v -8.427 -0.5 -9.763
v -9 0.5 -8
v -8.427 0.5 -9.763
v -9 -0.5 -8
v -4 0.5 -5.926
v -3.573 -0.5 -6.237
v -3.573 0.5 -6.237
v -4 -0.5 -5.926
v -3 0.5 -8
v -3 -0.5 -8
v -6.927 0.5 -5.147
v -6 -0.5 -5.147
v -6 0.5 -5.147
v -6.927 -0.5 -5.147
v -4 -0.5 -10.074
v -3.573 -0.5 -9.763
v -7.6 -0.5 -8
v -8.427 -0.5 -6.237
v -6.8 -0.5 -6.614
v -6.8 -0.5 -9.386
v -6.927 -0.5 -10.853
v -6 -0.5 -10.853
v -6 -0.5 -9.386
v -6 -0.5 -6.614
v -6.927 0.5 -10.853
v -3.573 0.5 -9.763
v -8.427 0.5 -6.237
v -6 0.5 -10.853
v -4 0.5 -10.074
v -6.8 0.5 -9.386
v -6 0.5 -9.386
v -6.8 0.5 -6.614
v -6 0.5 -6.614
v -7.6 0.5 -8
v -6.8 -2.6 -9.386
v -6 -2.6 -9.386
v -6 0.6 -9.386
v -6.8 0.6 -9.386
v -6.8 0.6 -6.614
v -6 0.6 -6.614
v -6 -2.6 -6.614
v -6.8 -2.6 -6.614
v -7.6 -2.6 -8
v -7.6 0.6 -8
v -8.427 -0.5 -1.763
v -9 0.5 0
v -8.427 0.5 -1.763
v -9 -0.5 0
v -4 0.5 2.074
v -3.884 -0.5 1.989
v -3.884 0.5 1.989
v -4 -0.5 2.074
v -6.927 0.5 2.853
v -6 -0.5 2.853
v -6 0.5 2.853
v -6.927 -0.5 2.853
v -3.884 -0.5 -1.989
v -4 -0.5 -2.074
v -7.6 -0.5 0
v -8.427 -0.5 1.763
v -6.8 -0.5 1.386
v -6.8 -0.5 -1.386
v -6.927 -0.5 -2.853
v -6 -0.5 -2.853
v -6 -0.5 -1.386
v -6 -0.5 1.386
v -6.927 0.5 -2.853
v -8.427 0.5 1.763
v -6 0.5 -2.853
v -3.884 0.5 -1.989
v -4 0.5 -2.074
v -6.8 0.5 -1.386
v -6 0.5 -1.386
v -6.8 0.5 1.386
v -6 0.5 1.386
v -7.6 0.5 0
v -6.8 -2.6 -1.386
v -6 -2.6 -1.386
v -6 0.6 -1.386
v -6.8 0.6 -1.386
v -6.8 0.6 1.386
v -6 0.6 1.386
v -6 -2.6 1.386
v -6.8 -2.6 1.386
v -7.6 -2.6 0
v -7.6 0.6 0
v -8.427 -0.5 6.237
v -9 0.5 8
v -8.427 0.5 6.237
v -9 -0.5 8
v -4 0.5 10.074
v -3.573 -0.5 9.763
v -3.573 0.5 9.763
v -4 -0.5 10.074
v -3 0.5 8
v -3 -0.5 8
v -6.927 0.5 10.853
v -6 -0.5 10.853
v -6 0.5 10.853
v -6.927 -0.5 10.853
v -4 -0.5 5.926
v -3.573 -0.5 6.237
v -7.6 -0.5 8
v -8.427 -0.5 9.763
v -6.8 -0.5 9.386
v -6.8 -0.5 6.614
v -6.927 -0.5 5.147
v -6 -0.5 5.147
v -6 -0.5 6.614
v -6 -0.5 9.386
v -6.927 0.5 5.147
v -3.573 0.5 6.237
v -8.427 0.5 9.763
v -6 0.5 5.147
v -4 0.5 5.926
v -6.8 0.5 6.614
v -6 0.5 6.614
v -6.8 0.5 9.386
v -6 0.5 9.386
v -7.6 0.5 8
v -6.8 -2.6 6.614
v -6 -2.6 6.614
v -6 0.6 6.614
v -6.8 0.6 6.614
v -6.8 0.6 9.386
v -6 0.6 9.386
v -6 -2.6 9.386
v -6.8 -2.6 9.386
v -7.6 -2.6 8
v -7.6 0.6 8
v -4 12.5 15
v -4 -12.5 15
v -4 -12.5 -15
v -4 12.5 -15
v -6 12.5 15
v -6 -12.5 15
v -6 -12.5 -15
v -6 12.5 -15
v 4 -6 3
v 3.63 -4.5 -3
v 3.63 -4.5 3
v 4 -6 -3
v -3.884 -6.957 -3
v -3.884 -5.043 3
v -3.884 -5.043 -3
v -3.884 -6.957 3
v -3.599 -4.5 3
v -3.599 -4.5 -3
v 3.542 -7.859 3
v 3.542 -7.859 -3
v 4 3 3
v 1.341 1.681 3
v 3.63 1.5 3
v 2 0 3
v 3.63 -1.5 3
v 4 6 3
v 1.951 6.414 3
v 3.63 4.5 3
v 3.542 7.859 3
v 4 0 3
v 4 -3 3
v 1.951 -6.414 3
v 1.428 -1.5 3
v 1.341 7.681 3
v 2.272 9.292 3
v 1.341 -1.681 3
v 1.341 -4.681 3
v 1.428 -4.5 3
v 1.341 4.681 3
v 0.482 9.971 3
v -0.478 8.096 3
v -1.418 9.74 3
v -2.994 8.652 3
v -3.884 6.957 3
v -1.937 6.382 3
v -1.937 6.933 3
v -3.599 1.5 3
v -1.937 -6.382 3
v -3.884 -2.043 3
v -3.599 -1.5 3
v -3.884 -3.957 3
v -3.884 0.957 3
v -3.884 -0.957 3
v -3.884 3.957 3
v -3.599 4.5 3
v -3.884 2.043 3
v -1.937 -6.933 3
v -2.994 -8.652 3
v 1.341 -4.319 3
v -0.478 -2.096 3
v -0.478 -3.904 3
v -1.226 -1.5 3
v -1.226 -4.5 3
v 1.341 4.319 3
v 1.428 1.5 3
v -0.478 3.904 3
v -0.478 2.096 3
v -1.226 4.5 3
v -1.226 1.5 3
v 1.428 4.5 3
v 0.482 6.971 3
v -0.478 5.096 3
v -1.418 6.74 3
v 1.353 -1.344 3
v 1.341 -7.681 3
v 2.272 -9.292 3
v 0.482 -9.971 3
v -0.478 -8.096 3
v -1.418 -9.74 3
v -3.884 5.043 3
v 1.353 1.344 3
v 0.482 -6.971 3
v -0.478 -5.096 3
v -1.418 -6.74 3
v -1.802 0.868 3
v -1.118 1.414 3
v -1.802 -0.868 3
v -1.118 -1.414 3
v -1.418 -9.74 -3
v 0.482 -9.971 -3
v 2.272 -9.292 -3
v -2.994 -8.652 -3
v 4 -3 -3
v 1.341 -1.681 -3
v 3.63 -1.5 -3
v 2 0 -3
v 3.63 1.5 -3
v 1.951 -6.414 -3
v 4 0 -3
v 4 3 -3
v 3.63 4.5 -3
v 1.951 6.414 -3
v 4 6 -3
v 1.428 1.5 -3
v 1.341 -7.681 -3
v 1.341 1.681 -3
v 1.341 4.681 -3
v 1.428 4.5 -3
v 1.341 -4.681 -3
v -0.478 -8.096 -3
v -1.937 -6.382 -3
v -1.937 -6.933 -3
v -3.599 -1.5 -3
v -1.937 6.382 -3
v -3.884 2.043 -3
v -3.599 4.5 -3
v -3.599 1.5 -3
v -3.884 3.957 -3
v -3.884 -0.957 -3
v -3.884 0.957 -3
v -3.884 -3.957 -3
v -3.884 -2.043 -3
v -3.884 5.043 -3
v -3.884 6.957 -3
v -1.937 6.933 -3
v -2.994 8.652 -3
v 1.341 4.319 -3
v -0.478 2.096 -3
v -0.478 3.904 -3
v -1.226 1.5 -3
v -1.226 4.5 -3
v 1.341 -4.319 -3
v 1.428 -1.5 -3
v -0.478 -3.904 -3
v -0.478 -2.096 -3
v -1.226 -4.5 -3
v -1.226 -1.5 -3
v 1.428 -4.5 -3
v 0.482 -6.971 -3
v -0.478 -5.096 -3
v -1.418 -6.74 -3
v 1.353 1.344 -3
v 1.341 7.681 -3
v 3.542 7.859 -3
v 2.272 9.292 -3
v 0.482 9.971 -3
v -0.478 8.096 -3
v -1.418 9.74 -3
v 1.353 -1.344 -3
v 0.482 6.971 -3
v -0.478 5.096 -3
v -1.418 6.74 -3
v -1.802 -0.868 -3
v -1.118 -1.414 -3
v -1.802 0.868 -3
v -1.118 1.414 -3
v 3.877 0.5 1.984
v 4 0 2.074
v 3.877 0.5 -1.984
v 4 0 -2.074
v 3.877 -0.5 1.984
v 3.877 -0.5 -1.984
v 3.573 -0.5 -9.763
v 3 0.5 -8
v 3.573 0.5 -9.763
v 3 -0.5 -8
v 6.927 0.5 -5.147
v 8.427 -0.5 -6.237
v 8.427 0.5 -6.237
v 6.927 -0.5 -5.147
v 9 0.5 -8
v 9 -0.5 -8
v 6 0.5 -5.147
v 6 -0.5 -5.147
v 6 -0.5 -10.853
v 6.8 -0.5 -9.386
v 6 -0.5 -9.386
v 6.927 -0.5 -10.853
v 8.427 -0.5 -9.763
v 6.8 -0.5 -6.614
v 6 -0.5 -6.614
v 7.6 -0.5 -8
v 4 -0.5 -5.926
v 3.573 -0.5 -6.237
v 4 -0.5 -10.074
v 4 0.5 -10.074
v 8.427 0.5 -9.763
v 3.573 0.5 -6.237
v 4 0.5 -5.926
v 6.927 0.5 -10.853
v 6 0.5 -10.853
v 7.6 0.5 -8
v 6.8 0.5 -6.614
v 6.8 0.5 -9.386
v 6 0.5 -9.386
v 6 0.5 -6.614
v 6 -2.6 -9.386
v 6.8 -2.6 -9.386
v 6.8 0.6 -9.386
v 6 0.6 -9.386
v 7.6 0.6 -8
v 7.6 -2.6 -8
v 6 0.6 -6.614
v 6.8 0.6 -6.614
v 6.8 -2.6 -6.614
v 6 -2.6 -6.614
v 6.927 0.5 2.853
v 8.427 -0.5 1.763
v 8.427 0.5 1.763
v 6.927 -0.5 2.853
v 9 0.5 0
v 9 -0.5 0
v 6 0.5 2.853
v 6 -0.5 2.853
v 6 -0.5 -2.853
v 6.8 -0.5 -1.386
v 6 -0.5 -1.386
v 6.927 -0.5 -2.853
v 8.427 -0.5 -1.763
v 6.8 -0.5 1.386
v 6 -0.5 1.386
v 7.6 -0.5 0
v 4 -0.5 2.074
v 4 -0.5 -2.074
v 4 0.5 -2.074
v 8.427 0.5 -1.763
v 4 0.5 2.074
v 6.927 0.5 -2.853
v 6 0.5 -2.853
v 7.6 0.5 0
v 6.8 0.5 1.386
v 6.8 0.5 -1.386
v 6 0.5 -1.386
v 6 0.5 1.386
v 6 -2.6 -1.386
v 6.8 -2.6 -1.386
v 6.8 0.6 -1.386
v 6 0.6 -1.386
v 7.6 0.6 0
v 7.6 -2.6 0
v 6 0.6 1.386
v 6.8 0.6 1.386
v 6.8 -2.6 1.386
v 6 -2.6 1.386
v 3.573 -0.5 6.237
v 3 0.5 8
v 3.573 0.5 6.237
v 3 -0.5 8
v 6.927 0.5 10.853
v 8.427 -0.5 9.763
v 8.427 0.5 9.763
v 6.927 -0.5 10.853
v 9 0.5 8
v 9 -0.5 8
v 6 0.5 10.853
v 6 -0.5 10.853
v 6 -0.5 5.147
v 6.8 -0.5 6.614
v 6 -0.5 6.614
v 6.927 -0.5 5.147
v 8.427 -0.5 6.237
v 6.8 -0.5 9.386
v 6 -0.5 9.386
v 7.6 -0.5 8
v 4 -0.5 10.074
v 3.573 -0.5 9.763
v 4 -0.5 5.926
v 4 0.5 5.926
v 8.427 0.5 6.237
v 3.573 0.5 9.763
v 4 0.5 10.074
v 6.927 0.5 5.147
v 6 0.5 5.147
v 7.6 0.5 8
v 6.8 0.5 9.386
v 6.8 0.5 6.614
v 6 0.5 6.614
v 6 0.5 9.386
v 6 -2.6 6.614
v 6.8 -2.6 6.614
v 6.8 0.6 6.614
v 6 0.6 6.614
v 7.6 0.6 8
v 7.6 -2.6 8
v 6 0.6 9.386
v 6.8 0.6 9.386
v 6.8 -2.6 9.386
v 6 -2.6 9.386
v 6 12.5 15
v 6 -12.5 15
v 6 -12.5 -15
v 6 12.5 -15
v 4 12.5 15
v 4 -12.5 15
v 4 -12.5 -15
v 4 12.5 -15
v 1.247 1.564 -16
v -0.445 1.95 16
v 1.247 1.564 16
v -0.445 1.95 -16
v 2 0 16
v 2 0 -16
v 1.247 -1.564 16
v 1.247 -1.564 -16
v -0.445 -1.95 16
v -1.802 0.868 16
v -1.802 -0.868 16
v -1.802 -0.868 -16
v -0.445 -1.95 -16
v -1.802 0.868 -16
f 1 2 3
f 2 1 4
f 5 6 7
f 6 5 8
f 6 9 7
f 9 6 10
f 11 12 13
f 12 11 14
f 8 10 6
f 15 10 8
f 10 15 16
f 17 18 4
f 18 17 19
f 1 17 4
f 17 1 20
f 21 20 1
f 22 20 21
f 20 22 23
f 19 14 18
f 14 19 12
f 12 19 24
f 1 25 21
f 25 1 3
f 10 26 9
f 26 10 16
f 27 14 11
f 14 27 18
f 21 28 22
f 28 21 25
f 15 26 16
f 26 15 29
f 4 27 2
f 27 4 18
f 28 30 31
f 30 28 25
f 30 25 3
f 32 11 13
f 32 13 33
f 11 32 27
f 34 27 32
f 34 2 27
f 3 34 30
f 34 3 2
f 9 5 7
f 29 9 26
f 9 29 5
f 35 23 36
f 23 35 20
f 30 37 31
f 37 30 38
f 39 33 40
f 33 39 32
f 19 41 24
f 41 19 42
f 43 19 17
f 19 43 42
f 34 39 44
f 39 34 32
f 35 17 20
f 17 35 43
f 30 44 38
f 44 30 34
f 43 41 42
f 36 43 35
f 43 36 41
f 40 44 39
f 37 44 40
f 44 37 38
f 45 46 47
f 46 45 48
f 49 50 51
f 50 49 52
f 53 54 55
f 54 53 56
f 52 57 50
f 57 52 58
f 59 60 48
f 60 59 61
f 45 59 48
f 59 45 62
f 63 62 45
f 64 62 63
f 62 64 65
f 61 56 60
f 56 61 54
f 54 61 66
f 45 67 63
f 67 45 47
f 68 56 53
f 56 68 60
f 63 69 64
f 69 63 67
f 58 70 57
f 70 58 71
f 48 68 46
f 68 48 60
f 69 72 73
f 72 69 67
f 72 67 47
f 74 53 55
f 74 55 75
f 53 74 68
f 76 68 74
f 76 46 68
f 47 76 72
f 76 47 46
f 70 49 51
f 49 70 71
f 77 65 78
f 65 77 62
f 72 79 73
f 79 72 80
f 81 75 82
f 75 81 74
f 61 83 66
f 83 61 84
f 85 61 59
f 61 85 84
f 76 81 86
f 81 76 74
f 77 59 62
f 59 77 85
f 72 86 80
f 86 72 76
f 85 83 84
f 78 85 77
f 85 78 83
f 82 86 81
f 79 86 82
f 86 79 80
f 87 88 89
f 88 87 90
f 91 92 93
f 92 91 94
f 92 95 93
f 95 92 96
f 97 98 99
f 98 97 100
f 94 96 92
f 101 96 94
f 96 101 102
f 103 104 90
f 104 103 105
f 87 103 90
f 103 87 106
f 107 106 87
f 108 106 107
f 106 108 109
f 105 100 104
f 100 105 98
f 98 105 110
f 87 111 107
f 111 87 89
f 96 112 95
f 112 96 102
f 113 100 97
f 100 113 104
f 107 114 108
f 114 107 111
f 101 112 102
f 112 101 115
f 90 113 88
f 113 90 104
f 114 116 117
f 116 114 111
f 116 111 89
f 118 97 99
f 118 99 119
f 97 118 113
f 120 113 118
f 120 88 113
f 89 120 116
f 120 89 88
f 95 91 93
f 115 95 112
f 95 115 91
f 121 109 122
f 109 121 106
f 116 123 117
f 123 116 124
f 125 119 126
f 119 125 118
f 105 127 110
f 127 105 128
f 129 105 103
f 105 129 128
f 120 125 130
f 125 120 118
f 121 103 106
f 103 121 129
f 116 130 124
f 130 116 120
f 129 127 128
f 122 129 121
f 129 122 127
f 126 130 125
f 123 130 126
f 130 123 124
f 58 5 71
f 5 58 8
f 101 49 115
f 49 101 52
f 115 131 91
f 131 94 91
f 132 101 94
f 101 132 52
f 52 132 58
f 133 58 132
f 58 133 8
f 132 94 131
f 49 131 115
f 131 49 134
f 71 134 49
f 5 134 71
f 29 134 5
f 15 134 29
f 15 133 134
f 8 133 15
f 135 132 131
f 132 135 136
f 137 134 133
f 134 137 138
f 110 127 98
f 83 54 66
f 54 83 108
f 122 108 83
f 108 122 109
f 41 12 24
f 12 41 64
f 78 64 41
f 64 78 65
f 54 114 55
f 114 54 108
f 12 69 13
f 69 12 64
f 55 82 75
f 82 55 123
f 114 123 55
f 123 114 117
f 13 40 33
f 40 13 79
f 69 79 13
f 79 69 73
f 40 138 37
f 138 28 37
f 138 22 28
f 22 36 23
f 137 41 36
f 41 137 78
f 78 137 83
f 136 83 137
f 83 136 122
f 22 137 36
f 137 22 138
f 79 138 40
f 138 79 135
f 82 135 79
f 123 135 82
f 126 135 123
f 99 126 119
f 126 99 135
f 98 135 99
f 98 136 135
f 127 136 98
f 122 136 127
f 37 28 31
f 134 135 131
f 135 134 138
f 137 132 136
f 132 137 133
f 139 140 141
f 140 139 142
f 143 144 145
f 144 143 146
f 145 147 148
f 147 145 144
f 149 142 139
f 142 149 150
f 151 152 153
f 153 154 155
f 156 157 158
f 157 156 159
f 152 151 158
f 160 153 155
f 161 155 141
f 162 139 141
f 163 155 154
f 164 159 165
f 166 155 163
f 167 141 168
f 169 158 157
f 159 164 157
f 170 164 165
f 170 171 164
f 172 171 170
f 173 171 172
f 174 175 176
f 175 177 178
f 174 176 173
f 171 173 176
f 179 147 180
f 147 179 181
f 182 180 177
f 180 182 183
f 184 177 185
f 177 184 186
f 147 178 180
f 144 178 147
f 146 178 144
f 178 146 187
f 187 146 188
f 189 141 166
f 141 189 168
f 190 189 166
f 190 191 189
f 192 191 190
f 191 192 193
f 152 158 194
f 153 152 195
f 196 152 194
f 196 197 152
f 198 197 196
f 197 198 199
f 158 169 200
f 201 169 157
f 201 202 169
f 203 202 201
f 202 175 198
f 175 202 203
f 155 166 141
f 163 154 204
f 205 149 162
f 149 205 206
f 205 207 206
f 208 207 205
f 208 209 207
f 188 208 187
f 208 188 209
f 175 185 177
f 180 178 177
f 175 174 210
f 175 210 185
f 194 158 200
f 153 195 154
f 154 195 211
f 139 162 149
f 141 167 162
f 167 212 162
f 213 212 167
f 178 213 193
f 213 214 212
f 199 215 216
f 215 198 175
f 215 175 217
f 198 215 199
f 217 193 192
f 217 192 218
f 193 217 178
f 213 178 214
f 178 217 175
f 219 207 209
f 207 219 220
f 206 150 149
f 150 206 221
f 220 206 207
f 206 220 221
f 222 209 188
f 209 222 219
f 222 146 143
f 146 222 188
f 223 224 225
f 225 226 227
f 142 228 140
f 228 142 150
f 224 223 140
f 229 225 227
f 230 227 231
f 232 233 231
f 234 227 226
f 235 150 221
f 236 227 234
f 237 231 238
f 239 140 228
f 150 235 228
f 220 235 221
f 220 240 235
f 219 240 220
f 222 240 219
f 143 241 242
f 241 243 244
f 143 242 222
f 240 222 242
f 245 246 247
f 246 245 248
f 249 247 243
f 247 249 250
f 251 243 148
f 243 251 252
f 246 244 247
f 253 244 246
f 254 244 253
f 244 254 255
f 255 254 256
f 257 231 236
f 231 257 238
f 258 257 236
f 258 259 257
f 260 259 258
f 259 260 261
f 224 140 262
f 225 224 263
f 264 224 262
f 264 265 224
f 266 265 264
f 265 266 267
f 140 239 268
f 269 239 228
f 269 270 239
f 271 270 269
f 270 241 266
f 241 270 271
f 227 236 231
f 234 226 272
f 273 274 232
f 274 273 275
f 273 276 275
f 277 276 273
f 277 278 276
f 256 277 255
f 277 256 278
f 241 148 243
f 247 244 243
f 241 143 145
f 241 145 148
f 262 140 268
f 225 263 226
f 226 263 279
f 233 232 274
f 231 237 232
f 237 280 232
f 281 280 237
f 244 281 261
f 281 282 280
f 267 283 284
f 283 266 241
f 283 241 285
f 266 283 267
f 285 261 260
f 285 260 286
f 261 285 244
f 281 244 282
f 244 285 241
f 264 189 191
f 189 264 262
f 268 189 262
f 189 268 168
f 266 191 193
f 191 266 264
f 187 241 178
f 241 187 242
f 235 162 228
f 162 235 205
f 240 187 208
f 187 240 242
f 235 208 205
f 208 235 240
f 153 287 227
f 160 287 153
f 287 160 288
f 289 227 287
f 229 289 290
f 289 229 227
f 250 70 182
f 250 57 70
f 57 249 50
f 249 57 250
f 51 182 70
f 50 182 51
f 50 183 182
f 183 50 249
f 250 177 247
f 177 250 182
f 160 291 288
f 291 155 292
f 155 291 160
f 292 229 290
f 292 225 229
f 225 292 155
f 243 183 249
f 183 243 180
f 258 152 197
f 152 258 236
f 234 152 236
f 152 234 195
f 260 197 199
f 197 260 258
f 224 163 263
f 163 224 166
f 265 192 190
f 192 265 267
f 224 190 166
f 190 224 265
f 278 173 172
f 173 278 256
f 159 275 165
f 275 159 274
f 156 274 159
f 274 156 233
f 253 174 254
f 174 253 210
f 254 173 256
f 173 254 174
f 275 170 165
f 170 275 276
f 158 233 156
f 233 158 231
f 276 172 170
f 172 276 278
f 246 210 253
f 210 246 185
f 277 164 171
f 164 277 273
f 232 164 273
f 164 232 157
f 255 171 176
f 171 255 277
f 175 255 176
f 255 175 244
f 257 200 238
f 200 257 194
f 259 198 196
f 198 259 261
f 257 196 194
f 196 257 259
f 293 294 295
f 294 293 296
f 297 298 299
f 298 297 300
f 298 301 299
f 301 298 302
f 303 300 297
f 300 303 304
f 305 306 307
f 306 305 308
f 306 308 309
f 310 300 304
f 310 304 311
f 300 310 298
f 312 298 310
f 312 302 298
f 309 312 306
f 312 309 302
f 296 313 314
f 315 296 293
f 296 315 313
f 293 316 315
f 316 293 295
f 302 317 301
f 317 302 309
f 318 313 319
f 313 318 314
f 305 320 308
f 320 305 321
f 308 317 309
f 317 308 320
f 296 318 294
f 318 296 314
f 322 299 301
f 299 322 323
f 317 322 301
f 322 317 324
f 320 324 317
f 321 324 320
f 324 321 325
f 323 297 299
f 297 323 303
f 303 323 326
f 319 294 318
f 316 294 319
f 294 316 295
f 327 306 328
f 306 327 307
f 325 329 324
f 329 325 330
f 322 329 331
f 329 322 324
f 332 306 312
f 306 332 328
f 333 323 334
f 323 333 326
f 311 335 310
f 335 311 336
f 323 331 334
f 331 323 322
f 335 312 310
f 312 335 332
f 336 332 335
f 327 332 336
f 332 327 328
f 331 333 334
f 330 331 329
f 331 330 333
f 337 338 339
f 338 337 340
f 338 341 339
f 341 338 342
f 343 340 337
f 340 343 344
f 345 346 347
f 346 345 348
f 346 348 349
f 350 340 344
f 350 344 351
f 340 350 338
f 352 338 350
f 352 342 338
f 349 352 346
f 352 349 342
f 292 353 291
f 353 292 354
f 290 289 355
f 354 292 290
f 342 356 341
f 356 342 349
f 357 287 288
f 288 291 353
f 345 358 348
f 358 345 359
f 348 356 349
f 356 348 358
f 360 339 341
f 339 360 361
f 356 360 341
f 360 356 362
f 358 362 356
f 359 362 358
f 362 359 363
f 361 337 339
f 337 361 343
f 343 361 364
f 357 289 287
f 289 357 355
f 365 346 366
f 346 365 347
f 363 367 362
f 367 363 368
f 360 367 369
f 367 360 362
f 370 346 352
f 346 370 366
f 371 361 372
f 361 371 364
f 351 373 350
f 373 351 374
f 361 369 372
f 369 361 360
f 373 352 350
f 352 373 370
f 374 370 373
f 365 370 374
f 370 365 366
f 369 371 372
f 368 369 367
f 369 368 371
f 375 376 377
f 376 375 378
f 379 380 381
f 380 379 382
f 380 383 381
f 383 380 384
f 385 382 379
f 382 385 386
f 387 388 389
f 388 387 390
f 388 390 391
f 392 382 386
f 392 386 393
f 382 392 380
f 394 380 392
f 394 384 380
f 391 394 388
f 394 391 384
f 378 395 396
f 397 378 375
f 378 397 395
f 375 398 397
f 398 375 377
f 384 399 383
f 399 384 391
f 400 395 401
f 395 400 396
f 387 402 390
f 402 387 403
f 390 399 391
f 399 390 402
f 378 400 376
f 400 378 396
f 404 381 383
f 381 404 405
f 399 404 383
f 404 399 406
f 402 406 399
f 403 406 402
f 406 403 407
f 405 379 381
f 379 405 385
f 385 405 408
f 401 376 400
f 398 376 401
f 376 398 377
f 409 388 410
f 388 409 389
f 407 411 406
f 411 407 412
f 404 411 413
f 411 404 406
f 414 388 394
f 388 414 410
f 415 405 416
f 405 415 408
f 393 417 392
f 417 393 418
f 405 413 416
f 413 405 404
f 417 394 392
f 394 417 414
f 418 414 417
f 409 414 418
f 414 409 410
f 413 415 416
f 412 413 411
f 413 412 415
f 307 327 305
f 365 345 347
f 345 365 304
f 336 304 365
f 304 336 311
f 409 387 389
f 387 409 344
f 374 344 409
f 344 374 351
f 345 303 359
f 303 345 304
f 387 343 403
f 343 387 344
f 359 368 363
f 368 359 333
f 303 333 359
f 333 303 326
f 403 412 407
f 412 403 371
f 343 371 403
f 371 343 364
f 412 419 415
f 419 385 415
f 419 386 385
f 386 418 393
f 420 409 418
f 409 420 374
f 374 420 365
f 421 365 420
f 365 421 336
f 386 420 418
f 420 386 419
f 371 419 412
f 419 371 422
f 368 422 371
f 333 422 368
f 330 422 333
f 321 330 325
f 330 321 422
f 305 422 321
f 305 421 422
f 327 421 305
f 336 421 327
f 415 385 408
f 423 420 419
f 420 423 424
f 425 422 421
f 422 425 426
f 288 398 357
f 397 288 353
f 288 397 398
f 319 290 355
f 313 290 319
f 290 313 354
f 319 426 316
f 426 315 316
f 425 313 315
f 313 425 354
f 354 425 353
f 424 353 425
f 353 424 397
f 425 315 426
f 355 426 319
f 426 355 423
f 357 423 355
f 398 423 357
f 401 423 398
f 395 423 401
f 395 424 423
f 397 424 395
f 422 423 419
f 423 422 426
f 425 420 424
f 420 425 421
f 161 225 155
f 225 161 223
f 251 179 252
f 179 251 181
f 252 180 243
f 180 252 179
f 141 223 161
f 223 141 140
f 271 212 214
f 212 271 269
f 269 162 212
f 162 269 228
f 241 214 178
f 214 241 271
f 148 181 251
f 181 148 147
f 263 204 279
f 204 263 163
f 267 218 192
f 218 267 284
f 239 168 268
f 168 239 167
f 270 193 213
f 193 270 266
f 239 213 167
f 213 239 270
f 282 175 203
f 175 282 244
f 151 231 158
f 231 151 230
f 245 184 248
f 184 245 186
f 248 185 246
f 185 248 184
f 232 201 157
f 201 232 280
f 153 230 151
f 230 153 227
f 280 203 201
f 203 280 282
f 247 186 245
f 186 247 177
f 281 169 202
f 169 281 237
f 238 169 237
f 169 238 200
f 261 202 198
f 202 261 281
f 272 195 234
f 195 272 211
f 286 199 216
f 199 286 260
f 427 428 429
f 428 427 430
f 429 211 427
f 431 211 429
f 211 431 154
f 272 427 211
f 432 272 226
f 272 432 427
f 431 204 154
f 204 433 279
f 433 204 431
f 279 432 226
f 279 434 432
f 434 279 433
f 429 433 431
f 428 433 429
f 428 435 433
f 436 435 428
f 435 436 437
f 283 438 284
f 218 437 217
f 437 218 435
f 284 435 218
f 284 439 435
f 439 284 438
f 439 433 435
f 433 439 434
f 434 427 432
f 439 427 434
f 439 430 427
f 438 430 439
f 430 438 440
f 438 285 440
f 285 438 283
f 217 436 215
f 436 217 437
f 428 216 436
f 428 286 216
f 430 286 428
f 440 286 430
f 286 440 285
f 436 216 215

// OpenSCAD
// Parameters
leaf_width = 25;
leaf_height = 30;
leaf_thickness = 2;
pin_diameter = 4;
pin_length = 32;
knuckle_outer_diameter = 8;
knuckle_inner_diameter = pin_diameter + 0.3;
knuckle_height = 6; // 30mm / 5 equal parts
num_knuckles_left = 3;
num_knuckles_right = 2;
m3_countersink_diameter = 6;
m3_countersink_depth = 1;
m3_hole_diameter = 3.2;
m3_hole_spacing = 8;

module pin() {
    cylinder(h = pin_length, d = pin_diameter, center = true);
}

module knuckle(side_multiplier) {
    difference() {
        cylinder(h = knuckle_height, d = knuckle_outer_diameter, center = true);
        cylinder(h = knuckle_height + 0.1, d = knuckle_inner_diameter, center = true); // +0.1 to ensure clean cut
    }
}

module leaf(side) {
    // Base leaf shape
    cube([leaf_thickness, leaf_width, leaf_height], center = true);

    // Mount holes
    translate([side * (leaf_thickness / 2), 0, -m3_hole_spacing]) {
        m3_countersink(side);
    }
    translate([side * (leaf_thickness / 2), 0, 0]) {
        m3_countersink(side);
    }
    translate([side * (leaf_thickness / 2), 0, m3_hole_spacing]) {
        m3_countersink(side);
    }
}

module m3_countersink(side) {
    rotate([90, 0, 0]) {
        cylinder(h = m3_countersink_depth, d = m3_countersink_diameter, center = true);
        translate([0, 0, m3_countersink_depth]) {
            cylinder(h = m3_hole_diameter, d = m3_hole_diameter, center = true);
        }
    }
}

// Assemble the hinge in 180 degree open state
module butt_hinge() {
    // Pin
    pin();

    // Left leaf and its knuckles
    left_leaf_x_offset = -knuckle_outer_diameter / 2 - leaf_thickness / 2;
    translate([left_leaf_x_offset, 0, 0]) {
        leaf(-1); // Left side
    }

    // Knuckles for the left leaf (interleaved)
    knuckle_y_offset_start = -(num_knuckles_left - 1) * knuckle_height / 2;
    for (i = [0 : num_knuckles_left - 1]) {
        // Knuckles for the left leaf are on the "outer" side relative to the pin
        // When open 180, left leaf is on x < 0, right leaf is on x > 0.
        // Knuckles for left leaf should be on the side closer to its leaf, so their outer surfaces will align with leaf surfaces when closed.
        // For 180 degree open, the knuckles will be on the "outside" of the pin's central axis.
        // Left leaf is on x < 0. Knuckles are on the "outer" side of the pin.
        translate([0, knuckle_y_offset_start + i * knuckle_height, 0]) {
            knuckle(-1); // Left side
        }
    }

    // Right leaf and its knuckles
    right_leaf_x_offset = knuckle_outer_diameter / 2 + leaf_thickness / 2;
    translate([right_leaf_x_offset, 0, 0]) {
        leaf(1); // Right side
    }

    // Knuckles for the right leaf (interleaved)
    knuckle_y_offset_start_right = -(num_knuckles_right - 1) * knuckle_height / 2;
    for (i = [0 : num_knuckles_right - 1]) {
        // Knuckles for the right leaf are on the "outer" side relative to the pin.
        // For 180 degree open, the knuckles will be on the "outside" of the pin's central axis.
        // Right leaf is on x > 0. Knuckles are on the "outer" side of the pin.
        translate([0, knuckle_y_offset_start_right + i * knuckle_height, 0]) {
            knuckle(1); // Right side
        }
    }
}

// Position the hinge at the origin
translate([0, 0, 0]) {
    butt_hinge();
}
